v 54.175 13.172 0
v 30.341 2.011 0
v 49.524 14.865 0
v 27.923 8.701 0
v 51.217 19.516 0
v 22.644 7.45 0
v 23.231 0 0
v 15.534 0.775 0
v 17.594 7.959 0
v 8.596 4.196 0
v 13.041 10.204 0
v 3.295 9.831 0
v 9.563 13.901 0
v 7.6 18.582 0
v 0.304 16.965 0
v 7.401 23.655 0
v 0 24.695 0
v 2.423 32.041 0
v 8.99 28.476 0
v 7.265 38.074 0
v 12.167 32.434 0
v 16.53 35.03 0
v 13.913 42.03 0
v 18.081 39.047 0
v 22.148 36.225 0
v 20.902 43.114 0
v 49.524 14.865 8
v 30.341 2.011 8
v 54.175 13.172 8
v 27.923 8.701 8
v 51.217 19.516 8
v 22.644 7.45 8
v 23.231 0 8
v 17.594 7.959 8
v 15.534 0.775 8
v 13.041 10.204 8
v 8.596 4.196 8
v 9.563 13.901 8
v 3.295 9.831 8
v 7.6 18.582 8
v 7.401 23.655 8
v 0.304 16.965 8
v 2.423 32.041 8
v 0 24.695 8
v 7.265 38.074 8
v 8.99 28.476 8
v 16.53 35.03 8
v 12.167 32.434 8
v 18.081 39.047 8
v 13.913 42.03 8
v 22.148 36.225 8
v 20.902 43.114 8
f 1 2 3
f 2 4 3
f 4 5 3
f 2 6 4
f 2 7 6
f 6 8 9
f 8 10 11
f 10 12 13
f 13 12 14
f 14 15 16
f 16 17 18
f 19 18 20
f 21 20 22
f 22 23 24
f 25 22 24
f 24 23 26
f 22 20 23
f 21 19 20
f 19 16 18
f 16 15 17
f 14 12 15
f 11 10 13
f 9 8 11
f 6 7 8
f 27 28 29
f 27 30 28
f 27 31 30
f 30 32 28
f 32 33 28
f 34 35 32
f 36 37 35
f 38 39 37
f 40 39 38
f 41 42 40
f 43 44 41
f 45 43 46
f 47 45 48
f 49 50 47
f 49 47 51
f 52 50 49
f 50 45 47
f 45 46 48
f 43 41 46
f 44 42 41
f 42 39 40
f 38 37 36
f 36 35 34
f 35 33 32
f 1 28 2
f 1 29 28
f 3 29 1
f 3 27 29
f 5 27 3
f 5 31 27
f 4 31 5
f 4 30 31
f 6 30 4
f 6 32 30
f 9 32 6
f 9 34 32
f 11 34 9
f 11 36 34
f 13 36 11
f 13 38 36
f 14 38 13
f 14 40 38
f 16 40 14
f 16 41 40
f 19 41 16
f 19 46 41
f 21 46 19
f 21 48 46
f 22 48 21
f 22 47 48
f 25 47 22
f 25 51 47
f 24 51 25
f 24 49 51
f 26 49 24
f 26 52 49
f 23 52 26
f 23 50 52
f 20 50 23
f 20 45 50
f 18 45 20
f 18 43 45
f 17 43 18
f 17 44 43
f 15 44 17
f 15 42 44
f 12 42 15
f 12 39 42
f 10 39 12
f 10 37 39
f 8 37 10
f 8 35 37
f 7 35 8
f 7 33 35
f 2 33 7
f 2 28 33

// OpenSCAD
$fn = 32;

// ----------------------------------------------------------------------
// Hook plate: curl radius 18 mm over 205 degrees, 7 mm thick band
// ----------------------------------------------------------------------

// --- parameters (mm) ---
profile_height = 8;       // extrusion height
profile_points = 26;      // points of the closed outline

profile = [[18.081, 39.047], [20.902, 43.114], [13.913, 42.03], [7.265, 38.074], [2.423, 32.041], [0, 24.695], [0.304, 16.965], [3.295, 9.831], [8.596, 4.196], [15.534, 0.775], [23.231, 0], [30.341, 2.011], [54.175, 13.172], [49.524, 14.865], [51.217, 19.516], [27.923, 8.701], [22.644, 7.45], [17.594, 7.959], [13.041, 10.204], [9.563, 13.901], [7.6, 18.582], [7.401, 23.655], [8.99, 28.476], [12.167, 32.434], [16.53, 35.03], [22.148, 36.225]];  // single closed polygon, 26 points, counter clockwise

// --- the one profile operation ---
linear_extrude(height = profile_height) polygon(points = profile);
